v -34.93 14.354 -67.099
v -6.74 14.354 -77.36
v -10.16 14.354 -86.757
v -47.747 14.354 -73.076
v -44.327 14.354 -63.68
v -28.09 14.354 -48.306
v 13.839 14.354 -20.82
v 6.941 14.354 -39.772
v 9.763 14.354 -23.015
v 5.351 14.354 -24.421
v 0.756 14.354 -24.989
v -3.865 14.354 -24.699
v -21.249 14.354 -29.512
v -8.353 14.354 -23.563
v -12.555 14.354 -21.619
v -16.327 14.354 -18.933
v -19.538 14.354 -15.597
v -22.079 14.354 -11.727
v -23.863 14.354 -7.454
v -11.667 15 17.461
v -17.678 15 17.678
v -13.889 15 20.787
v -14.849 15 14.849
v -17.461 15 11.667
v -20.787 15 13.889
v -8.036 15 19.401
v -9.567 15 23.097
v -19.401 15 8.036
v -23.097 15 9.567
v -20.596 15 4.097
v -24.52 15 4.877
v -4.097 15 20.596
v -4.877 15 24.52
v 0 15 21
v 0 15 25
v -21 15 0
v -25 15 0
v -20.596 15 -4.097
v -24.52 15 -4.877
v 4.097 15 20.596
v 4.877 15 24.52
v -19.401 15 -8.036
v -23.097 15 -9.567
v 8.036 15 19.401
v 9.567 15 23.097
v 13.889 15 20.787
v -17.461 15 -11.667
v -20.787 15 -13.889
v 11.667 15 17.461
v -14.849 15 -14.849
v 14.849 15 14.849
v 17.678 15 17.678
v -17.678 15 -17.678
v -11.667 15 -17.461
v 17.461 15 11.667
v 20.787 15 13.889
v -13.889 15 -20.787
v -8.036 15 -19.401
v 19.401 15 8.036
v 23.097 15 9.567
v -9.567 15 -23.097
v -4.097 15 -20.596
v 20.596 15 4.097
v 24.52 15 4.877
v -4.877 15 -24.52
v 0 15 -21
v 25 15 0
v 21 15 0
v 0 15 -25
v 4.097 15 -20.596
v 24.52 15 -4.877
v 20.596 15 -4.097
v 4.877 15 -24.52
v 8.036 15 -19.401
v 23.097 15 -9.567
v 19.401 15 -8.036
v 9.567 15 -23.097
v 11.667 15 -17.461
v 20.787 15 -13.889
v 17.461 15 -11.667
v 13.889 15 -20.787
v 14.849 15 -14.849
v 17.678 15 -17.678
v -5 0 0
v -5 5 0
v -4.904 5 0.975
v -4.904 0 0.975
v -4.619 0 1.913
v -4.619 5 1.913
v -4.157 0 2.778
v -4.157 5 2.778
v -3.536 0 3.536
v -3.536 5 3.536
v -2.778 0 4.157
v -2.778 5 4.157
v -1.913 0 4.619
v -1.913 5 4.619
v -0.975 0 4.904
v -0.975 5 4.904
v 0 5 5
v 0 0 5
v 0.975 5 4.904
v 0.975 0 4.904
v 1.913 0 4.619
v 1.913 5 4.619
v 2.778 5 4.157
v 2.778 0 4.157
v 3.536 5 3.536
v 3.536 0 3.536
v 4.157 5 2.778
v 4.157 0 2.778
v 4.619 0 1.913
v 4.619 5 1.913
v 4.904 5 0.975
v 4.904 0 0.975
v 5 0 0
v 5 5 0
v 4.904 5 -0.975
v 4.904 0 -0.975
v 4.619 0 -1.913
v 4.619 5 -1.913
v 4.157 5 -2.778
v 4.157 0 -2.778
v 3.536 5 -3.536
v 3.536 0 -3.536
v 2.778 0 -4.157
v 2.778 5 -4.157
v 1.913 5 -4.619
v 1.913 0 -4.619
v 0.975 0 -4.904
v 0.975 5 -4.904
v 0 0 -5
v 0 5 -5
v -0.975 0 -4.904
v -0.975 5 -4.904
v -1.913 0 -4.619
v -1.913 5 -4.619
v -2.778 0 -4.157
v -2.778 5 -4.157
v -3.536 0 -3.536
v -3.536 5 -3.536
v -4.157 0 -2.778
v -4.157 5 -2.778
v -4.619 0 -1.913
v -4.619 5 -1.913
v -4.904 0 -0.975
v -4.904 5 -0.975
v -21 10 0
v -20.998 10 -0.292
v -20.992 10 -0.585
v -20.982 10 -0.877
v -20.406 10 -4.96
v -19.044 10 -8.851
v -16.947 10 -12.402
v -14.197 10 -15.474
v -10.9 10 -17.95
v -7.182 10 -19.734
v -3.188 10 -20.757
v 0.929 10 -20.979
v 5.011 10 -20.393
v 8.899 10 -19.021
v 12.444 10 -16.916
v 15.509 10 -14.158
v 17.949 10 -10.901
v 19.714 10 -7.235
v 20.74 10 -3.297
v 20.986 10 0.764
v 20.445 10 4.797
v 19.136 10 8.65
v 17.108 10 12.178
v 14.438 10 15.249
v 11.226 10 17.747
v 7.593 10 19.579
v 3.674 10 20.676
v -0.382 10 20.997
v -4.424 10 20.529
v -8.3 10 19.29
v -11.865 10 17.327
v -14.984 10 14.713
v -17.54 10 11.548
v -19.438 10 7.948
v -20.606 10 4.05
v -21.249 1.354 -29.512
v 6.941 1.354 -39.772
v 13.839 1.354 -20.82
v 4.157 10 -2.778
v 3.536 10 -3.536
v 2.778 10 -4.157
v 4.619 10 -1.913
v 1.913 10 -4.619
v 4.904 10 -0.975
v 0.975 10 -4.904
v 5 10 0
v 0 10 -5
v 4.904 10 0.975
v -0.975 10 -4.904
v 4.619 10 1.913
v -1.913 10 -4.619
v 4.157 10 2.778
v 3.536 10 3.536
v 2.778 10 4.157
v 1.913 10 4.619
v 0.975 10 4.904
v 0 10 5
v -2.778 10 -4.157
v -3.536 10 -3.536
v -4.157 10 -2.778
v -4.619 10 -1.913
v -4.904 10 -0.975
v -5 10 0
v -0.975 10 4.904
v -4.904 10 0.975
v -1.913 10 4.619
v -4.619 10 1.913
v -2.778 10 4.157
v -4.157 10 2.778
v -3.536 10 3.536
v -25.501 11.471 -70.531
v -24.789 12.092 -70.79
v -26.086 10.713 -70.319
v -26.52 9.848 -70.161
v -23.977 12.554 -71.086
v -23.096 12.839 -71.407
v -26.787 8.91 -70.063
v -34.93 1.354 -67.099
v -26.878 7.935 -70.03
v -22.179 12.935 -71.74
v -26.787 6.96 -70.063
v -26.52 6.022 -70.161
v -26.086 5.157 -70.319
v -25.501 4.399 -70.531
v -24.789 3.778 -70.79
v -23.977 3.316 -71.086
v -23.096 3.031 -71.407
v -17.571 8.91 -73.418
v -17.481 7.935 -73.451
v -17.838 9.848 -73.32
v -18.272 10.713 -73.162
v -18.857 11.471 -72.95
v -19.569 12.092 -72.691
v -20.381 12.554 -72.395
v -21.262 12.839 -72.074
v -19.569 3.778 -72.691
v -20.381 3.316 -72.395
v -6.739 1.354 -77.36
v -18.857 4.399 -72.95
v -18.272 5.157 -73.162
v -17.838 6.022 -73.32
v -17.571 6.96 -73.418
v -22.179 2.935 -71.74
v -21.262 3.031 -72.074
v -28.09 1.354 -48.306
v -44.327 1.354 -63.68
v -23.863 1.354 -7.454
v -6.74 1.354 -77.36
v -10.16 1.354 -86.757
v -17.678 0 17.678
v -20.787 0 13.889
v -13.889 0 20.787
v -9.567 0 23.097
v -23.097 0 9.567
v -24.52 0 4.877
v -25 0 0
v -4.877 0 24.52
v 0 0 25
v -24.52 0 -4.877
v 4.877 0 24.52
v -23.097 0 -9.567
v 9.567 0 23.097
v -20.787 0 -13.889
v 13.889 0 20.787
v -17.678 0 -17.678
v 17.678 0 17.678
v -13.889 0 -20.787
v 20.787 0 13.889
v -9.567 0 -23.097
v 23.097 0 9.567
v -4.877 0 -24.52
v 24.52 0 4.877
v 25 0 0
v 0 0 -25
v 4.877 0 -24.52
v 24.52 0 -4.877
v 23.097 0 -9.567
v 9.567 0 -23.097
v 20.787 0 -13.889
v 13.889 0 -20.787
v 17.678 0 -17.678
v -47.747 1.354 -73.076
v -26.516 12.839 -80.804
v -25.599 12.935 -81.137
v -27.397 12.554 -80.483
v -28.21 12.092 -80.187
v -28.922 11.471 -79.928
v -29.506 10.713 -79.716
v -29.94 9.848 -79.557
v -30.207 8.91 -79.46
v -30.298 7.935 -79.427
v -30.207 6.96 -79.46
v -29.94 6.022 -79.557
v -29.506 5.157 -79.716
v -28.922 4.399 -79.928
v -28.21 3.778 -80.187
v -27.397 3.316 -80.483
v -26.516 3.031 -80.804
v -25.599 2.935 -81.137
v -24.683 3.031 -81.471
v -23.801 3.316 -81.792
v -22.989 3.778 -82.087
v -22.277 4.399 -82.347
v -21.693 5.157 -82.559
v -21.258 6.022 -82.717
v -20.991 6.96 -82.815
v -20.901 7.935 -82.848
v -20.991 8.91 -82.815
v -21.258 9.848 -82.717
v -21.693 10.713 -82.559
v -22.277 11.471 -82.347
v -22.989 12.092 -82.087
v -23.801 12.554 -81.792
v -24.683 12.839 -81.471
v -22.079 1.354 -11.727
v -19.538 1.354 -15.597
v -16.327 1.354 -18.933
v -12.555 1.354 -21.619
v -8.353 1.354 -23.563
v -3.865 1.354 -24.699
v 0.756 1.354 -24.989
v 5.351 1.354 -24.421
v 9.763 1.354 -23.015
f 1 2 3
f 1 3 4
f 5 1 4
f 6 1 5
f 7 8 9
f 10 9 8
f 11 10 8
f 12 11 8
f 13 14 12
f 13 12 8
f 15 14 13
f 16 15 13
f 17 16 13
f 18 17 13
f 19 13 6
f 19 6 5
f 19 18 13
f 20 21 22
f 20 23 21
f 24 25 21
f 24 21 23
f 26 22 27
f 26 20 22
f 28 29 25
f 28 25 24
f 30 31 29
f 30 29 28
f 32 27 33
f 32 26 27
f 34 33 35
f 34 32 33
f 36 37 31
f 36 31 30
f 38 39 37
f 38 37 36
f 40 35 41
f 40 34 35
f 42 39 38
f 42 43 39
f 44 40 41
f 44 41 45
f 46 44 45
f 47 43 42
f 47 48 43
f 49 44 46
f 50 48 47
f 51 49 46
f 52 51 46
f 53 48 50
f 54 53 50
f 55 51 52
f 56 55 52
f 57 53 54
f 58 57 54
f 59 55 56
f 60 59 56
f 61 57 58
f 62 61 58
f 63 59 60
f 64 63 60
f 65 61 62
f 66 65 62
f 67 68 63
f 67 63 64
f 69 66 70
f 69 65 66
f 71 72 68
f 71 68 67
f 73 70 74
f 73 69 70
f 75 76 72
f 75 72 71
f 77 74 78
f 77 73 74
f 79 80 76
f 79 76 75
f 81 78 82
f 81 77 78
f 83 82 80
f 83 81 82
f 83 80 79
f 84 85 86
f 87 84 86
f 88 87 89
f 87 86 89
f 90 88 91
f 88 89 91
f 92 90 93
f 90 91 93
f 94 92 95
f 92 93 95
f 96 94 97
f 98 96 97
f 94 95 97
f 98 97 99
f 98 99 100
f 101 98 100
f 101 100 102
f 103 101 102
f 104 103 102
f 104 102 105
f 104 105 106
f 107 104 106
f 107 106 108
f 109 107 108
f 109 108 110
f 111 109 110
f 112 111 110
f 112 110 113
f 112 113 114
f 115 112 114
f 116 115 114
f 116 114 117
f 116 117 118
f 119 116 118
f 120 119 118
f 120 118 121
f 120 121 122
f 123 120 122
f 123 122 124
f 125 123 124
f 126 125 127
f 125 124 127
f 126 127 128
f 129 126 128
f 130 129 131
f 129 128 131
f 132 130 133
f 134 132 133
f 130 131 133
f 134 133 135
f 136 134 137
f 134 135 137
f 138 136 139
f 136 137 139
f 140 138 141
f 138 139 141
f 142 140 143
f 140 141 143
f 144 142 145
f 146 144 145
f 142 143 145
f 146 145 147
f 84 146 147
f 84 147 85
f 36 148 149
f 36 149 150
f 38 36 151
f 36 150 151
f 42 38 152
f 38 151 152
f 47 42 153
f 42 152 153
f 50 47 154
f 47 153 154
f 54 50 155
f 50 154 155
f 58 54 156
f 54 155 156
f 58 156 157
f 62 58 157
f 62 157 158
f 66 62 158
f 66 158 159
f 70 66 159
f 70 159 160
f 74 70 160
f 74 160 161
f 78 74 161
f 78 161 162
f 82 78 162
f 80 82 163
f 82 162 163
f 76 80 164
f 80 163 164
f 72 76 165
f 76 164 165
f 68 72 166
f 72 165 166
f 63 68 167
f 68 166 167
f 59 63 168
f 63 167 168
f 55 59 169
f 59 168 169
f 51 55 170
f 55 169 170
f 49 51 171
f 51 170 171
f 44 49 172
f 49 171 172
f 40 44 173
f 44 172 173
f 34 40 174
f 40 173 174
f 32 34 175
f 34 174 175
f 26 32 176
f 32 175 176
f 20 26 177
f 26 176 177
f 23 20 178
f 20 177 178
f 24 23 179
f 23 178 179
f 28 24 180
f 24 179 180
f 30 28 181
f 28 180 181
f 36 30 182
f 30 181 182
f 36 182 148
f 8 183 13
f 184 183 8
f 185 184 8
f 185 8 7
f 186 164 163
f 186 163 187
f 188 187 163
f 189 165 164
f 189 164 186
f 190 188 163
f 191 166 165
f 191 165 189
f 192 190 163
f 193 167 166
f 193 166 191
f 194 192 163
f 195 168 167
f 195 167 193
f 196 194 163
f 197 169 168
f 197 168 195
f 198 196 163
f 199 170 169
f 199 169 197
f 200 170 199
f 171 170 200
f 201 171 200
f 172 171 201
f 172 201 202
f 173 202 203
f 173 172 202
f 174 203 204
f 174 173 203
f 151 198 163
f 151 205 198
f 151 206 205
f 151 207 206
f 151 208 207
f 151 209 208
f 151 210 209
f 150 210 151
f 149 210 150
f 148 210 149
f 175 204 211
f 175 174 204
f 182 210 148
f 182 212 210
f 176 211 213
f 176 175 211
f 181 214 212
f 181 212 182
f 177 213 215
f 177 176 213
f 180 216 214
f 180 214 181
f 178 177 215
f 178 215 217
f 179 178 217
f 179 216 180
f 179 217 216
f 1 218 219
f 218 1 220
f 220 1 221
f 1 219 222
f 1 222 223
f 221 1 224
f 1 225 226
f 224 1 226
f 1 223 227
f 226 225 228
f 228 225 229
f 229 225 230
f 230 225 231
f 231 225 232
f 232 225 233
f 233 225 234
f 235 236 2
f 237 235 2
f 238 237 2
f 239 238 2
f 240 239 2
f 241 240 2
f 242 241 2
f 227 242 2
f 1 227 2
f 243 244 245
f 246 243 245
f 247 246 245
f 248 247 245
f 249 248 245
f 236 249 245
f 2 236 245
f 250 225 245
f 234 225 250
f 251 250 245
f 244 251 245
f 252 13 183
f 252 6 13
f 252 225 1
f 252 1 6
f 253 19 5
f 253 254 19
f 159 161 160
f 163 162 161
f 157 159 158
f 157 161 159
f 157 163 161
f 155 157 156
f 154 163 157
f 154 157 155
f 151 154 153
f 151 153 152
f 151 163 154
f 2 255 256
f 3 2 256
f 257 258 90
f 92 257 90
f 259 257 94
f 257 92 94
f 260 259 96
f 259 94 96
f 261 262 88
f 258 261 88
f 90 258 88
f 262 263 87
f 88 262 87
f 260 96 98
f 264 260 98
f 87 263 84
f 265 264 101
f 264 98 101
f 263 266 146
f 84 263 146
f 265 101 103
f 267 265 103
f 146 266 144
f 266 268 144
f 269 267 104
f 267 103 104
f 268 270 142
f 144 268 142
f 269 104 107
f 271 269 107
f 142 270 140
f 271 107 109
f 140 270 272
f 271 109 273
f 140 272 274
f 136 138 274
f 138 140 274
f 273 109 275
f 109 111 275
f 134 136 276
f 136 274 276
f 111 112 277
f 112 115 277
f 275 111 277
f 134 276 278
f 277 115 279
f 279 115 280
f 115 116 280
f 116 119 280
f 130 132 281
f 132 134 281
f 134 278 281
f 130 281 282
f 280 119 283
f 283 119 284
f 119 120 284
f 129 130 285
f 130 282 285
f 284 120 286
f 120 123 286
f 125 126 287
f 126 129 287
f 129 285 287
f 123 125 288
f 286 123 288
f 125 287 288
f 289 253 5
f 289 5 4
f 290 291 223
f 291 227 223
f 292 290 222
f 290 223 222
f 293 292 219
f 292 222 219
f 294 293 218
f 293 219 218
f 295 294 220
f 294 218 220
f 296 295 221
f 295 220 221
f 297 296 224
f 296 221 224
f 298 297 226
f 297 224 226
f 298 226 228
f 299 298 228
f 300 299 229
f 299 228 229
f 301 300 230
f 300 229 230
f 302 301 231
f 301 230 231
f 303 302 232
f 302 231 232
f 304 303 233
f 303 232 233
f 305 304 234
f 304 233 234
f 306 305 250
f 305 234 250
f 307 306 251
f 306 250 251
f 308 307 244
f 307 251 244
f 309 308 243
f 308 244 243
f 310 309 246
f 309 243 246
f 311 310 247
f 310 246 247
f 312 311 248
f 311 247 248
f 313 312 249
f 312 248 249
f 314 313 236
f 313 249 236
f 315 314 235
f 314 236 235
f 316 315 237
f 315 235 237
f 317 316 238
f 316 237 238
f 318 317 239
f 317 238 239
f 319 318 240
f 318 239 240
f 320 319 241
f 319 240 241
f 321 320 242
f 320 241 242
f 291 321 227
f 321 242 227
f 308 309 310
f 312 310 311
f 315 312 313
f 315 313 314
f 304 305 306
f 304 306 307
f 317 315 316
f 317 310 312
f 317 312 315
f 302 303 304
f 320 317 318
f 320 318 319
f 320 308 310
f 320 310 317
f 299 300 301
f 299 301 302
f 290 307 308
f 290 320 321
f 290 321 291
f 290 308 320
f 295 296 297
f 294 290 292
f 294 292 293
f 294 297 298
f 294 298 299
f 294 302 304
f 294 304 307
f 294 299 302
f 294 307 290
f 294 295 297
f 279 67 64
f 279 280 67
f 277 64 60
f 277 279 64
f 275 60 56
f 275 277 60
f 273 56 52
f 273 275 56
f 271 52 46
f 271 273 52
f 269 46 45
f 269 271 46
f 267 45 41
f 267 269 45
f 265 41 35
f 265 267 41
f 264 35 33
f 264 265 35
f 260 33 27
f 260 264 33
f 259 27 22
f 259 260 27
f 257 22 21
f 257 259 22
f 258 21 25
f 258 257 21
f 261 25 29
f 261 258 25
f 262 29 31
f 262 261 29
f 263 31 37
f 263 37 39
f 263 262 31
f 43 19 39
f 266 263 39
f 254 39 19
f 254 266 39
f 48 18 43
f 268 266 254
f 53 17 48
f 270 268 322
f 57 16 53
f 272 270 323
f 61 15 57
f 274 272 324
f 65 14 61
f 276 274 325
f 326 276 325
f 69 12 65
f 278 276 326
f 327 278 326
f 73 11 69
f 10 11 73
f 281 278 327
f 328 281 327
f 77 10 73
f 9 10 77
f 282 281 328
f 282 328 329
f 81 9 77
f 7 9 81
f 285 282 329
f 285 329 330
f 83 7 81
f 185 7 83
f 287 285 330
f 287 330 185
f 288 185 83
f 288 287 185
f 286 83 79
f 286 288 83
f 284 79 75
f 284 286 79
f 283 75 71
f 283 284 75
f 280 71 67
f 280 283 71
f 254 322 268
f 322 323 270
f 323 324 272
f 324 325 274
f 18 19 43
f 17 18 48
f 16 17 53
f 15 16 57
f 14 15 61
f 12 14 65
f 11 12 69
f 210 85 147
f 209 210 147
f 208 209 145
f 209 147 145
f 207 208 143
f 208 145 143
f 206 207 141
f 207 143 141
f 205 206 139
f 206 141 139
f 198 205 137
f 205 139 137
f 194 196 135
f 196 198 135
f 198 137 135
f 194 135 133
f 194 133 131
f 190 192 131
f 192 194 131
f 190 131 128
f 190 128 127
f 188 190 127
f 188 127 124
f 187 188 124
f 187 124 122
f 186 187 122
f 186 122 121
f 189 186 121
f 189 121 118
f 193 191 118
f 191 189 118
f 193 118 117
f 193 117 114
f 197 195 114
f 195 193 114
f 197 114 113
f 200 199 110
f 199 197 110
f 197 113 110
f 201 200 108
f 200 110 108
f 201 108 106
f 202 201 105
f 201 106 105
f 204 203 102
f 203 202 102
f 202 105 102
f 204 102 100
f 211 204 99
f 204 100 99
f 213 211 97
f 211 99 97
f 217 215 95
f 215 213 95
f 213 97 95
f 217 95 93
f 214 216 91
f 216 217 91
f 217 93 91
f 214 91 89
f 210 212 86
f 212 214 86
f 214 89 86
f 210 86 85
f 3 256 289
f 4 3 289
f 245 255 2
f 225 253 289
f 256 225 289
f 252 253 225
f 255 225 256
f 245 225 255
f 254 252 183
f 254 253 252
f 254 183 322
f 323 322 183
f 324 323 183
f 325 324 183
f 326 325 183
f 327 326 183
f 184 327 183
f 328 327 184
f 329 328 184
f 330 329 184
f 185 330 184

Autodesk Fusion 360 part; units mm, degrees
sketch "Sketch1" plane through (0, 0, 0) normal (0, 1, 0) x (1, 0, 0)
  circle A0 centre (0, 0) radius 25
  dimension "d1" = 50
extrude "Extrude1" add sketch "Sketch1" along normal blind 10
sketch "Sketch2" plane through (0, 10, 0) normal (0, 1, 0) x (-1, 0, 0)
  circle A0 centre (0, 0) radius 25
  circle A1 centre (0, 0) radius 21
  dimension "d4" = 42
extrude "Extrude2" cut sketch "Sketch2" against normal blind 5 contours A1
sketch "Sketch3" plane through (0, 5, 0) normal (0, 1, 0) x (-1, 0, 0)
  circle A0 centre (0, 0) radius 21
  circle A1 centre (0, 0) radius 5
  dimension "d7" = 10
extrude "Extrude3" cut sketch "Sketch3" against normal through all contours A1
ref_plane "WorkPlane1" through (-8.5505, 3.5882, -23.4923) normal (-0.342, 0, -0.9397) x (0.9397, 0, -0.342)
sketch "Sketch4" plane through (-8.5505, 3.5882, -23.4923) normal (-0.342, 0, -0.9397) x (0.9397, 0, -0.342)
  line L0 (-19.8743, 2.2343) -> (20.1257, 2.2343)
  line L1 (20.1257, 2.2343) -> (20.1257, -5.7657)
  line L2 (20.1257, -5.7657) -> (-19.8743, -5.7657)
  line L3 (-19.8743, -5.7657) -> (-19.8743, 2.2343)
  line L4 (-19.8743, 2.2343) -> (20.1257, -5.7657) construction
  line L5 (20.1257, 2.2343) -> (-19.8743, -5.7657) construction
  point P0 (0.1257, -1.7657)
  dimension "d10" = 40
  dimension "d11" = 8
extrude "Extrude4" add sketch "Sketch4" along normal blind 50 and the other way blind 17
extrude "Extrude5" cut 1 faces at (-8.2808, 9.3539, -12.2547) along direction (0, -1, 0) blind 4
extrude "Extrude6" add 1 faces at (-8.2808, 5.3539, -12.2547) along direction (0, -1, 0) blind 5
extrude "Extrude7" cut 1 faces at (-8.2808, 5.3539, -12.2547) along direction (0, -1, 0) blind 0.354
extrude "Extrude8" add 1 faces at (-19.2688, 6.6872, -72.8001) along direction (-0.34202, 0, -0.939693) blind 10
sketch "Sketch5" plane through (0, 9.3539, 0) normal (0, 1, 0) x (-1, 0, 0)
  arc A0 (-13.8395, -20.8199) -> (23.8629, -7.4541) centre (0, 0) ccw
  line L0 (-13.8395, -20.8199) -> (10.1597, -86.757)
  line L1 (10.1597, -86.757) -> (47.7474, -73.0762)
  line L2 (47.7474, -73.0762) -> (23.8629, -7.4541)
  line L3 (10.1597, -86.757) -> (6.7395, -77.36)
  line L4 (34.9302, -67.0994) -> (28.0898, -48.3056)
  line L5 (28.0898, -48.3056) -> (-0.1009, -58.5662)
  line L6 (34.9302, -67.0994) -> (6.7395, -77.36)
  dimension "d24" = 10
  dimension "d26" = 20
extrude "Extrude9" cut sketch "Sketch5" against normal through all contours L0 L4 L5 L6
extrude "Extrude10" add 1 faces at (-11.5472, 9.3539, -43.6568) along direction (0, 1, 0) blind 5
extrude "Extrude11" add 1 faces at (-22.8793, 10, -5.8181) along direction (0, 1, 0) blind 5
extrude "Extrude12" add 1 faces at (-2.433, 5, -6.5632) along direction (0, 1, 0) blind 5
extrude "Extrude13" add 1 faces at (-8.2808, 4.9999, -12.2547) along direction (0, 1, 0) blind 5
extrude "Extrude14" cut 1 faces at (-18.6929, 10.0206, -51.7258) along direction (0.34202, 0, 0.939693) blind 20
hole "Hole1" at (-25.5993, 7.935, -81.1374) direction (0.342, 0, 0.9397) diameter 10 depth 14 tip angle 118
